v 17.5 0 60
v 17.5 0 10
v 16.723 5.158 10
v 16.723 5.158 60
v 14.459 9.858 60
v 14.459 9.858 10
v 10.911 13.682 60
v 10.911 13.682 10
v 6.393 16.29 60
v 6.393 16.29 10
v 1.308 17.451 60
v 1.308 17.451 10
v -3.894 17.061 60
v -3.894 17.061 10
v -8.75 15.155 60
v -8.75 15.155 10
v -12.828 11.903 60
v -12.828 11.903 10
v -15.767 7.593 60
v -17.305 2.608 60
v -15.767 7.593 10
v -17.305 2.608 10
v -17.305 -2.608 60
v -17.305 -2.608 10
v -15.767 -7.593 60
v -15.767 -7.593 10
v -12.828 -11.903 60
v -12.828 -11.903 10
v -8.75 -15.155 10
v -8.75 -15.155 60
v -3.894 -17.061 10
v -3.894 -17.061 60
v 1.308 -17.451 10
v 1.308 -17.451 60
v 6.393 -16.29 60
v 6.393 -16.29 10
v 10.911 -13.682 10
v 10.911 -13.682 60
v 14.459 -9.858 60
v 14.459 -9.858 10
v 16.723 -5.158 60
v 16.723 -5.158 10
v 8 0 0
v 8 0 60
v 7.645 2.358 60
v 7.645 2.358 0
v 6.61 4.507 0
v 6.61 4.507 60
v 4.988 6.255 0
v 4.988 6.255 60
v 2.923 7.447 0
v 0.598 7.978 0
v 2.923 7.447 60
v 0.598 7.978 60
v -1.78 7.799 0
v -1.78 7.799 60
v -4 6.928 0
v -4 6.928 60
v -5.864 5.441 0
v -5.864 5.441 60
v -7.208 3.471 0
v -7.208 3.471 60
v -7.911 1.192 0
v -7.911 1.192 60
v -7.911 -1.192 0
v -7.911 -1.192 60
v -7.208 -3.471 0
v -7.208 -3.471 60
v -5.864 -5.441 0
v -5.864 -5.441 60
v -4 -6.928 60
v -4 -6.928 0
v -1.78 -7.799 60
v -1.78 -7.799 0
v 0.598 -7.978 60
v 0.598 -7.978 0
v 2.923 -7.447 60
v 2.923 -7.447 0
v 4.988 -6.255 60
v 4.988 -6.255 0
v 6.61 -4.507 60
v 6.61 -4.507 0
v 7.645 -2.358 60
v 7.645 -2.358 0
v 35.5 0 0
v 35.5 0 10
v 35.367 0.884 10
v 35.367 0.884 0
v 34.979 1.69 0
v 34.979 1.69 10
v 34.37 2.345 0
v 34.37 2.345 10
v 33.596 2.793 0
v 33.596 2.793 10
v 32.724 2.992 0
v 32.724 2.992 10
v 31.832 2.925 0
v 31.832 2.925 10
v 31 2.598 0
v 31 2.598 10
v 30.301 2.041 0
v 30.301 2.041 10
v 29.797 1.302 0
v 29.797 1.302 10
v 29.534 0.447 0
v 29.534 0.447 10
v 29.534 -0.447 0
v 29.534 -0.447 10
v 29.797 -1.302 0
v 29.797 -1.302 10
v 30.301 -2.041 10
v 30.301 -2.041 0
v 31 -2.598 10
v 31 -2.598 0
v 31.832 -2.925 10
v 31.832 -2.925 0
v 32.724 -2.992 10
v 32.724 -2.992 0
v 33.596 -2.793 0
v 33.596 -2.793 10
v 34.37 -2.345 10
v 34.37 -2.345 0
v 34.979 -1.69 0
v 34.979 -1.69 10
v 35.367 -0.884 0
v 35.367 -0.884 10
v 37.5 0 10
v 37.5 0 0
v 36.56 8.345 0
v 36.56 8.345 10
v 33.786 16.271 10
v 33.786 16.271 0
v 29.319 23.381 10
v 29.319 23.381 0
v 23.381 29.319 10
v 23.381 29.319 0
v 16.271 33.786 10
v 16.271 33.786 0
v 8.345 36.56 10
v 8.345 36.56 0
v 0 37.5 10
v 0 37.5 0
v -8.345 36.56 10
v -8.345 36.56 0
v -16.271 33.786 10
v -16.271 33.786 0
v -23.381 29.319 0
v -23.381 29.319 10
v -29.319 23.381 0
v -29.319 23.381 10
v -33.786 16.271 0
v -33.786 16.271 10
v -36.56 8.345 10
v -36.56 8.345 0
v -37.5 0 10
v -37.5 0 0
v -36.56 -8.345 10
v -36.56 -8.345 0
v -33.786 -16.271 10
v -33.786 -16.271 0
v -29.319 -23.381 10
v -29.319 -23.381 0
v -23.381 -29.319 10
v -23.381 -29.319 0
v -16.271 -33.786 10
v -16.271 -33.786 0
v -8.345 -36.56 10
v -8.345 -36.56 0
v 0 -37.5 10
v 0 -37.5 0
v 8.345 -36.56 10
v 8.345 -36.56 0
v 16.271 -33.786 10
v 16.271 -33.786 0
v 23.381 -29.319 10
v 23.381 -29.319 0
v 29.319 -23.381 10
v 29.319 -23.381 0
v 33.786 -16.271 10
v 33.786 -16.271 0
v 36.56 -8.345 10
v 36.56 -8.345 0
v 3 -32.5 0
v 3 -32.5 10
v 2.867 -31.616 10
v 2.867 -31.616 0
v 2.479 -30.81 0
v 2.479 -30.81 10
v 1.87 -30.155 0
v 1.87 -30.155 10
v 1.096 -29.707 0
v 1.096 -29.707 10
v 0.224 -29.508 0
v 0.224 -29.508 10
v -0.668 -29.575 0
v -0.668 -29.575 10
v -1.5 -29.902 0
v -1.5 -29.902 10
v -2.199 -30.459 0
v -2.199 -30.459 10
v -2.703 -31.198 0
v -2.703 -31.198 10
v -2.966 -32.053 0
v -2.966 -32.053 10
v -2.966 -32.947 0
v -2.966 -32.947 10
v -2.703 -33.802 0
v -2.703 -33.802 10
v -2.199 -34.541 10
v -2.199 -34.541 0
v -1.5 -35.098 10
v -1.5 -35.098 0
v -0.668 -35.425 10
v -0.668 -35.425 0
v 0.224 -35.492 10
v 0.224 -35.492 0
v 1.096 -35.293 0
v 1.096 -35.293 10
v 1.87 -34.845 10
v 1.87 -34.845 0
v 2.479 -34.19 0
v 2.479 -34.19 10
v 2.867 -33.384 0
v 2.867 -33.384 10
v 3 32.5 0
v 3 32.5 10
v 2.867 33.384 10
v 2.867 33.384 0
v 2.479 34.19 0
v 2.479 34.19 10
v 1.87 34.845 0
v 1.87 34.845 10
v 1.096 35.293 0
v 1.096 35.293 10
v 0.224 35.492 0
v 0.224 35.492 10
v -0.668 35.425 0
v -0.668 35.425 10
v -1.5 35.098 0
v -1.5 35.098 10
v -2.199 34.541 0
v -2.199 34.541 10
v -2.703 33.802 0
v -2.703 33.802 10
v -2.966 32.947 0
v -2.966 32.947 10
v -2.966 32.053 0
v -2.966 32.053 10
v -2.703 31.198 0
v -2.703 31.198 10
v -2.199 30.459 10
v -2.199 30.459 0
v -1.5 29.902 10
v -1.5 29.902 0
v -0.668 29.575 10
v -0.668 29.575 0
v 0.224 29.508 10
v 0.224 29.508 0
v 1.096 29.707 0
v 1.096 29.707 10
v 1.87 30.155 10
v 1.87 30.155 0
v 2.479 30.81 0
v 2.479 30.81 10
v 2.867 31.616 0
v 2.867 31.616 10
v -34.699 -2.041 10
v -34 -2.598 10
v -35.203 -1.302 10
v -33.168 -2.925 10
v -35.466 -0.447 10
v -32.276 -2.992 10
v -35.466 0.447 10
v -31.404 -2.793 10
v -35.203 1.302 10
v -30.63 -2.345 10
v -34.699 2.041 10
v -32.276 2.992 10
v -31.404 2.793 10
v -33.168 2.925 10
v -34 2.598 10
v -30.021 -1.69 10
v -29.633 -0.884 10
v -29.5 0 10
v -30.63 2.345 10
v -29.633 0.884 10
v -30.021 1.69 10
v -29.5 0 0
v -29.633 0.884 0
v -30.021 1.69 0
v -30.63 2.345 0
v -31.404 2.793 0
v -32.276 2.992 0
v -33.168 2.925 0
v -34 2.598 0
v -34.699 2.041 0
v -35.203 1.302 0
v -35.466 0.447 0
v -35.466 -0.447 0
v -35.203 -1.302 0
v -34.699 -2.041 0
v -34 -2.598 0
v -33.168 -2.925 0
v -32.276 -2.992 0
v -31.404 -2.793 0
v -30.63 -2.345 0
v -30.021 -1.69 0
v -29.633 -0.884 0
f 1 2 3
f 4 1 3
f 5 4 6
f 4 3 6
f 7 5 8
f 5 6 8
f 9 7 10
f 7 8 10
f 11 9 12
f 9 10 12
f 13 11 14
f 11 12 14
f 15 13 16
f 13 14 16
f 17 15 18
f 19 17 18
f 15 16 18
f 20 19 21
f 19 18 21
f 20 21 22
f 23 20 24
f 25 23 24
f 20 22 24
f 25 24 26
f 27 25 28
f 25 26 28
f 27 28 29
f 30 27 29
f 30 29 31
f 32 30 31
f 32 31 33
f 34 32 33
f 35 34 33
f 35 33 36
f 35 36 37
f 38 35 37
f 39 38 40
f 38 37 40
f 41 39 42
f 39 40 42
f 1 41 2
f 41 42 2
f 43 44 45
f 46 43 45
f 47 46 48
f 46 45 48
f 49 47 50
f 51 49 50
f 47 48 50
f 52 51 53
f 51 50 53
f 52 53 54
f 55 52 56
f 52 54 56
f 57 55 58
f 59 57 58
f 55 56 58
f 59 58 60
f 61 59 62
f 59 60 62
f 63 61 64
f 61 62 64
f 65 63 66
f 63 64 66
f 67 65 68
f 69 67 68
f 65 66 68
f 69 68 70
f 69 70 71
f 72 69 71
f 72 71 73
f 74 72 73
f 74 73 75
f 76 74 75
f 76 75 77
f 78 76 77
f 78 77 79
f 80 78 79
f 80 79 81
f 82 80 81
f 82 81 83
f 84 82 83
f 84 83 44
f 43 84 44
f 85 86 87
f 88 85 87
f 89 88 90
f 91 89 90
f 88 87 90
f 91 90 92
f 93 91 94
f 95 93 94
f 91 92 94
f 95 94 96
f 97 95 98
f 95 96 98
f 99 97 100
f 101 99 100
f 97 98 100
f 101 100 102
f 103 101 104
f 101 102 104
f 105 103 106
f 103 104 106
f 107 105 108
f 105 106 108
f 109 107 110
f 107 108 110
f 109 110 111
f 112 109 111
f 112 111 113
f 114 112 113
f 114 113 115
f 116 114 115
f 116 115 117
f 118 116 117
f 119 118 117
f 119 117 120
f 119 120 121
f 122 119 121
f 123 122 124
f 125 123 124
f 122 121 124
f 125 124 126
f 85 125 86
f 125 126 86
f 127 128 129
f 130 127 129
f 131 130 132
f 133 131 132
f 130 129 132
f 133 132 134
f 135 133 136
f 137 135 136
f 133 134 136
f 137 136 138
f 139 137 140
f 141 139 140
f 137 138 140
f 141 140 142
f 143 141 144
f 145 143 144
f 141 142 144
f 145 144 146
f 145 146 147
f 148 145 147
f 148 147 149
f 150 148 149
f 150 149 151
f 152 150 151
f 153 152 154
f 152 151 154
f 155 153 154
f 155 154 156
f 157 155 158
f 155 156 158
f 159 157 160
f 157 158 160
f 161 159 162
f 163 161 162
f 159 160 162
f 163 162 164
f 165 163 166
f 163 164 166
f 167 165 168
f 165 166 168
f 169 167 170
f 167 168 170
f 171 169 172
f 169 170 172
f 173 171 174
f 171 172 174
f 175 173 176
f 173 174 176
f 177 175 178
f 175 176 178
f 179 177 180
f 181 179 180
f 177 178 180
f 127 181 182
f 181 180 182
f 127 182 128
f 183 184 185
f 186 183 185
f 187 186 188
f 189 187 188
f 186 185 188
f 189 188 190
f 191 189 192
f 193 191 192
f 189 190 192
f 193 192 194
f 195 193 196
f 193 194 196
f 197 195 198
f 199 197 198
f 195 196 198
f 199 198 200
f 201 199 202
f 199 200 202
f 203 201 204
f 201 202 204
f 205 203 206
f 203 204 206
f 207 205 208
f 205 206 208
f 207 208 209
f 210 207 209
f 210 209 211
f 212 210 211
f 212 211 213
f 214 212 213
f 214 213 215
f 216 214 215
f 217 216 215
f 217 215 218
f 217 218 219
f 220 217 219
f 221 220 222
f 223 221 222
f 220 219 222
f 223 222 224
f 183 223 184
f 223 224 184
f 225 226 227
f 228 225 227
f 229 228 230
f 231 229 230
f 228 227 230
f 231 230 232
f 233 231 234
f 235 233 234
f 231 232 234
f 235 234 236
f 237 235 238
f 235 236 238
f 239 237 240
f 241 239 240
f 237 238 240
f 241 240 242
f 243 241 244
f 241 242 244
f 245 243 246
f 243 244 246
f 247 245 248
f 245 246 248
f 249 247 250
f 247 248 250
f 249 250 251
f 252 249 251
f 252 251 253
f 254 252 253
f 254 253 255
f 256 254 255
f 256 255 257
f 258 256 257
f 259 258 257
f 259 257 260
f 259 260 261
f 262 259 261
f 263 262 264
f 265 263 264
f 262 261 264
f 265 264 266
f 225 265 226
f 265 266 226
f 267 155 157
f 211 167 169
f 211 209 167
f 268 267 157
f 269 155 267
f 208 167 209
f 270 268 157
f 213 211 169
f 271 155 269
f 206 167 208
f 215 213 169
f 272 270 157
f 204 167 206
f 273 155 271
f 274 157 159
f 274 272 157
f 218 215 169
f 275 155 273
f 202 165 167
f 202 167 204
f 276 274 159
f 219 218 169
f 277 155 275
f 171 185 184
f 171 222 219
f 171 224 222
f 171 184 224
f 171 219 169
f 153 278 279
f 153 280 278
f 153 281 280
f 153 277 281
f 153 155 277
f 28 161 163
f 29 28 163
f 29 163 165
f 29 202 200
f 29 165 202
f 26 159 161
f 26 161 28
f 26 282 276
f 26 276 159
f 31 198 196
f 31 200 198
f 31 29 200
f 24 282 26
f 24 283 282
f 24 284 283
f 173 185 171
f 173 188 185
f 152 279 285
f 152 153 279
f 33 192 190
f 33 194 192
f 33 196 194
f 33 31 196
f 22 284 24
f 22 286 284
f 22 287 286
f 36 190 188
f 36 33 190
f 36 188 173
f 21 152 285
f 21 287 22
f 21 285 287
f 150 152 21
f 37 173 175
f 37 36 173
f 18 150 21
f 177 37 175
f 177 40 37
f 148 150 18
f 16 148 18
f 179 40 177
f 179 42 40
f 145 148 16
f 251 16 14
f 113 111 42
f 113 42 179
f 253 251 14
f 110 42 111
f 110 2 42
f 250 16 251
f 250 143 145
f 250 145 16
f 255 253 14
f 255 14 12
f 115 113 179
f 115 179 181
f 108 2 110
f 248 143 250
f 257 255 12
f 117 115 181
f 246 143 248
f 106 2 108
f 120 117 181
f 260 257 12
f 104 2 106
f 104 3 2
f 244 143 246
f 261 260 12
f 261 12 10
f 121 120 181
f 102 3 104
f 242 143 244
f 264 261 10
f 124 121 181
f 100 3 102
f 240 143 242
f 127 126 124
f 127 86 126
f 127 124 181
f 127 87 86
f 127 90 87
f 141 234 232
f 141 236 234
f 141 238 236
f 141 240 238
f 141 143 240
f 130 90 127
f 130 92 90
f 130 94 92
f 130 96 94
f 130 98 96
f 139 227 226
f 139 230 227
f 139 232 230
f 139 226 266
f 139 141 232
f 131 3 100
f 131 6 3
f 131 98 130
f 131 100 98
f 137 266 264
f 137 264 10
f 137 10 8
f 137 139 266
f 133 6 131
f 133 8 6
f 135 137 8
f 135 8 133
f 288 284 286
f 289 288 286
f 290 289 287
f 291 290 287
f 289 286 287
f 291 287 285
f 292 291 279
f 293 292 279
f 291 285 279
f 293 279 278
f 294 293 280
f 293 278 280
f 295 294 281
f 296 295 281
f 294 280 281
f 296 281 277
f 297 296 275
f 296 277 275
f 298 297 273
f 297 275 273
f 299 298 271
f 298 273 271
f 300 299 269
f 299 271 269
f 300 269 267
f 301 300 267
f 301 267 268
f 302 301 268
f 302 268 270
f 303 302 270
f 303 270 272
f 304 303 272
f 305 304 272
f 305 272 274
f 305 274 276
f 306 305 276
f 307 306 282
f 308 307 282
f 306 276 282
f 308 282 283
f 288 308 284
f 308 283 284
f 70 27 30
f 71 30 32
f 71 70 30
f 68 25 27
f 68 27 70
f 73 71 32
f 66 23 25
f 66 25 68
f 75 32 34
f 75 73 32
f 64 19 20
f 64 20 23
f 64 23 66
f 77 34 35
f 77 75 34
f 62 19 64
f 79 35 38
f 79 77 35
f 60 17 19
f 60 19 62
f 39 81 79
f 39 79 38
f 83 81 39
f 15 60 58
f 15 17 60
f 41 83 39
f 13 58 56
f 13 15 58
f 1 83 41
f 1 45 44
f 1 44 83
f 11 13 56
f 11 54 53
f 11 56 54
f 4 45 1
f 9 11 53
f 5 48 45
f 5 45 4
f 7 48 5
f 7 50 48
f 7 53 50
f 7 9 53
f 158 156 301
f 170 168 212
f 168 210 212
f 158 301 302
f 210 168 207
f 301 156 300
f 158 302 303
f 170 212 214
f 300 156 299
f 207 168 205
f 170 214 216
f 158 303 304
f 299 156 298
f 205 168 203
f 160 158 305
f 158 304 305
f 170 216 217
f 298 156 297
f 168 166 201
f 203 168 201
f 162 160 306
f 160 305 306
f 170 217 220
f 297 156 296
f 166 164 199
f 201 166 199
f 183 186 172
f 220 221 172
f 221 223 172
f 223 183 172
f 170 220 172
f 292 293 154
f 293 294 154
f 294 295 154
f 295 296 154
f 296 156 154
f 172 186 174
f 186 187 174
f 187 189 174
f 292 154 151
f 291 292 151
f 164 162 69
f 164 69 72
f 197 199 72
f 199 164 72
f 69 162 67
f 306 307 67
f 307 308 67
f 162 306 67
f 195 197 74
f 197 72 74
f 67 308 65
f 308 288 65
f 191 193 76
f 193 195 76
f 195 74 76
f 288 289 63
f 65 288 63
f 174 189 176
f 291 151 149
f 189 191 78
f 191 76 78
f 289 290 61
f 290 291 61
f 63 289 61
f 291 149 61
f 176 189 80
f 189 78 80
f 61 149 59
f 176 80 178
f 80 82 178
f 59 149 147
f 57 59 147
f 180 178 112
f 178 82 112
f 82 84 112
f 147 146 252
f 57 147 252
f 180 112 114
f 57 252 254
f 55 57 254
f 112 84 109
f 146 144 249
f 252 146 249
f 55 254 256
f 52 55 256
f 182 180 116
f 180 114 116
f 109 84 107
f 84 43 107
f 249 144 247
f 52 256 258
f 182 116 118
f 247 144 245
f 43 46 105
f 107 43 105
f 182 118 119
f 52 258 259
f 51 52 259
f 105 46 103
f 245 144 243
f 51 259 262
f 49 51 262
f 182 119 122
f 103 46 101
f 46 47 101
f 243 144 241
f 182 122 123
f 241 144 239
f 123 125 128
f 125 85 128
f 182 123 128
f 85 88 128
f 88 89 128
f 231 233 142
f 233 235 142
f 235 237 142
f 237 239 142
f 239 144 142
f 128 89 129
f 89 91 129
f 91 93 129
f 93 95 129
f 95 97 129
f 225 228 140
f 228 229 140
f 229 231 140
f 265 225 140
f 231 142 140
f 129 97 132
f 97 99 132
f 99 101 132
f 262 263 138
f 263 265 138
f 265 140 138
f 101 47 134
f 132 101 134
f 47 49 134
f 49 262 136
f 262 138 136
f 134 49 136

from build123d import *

# Parameters (mm, degrees)
SKETCH_1_R          = 37.5
EXTRUDE_1_DEPTH     = 10
SKETCH_2_R          = 17.5
EXTRUDE_2_DEPTH     = 50
SKETCH_3_R          = 8
CUT_EXTRUDE_1_DEPTH = 61
SKETCH_4_R          = 3
CUT_EXTRUDE_2_DEPTH = 10


with BuildPart() as part:
    # 草图1 → 凸台-拉伸1 (new body)
    with BuildSketch(Plane.XY):
        Circle(SKETCH_1_R)
    extrude(amount=EXTRUDE_1_DEPTH)

    # 草图2 → 凸台-拉伸2 (add)
    with BuildSketch(Plane.XY.offset(10)):
        Circle(SKETCH_2_R)
    extrude(amount=EXTRUDE_2_DEPTH)

    # 草图3 → 切除-拉伸1 (cut, through all)
    with BuildSketch(Plane.XY.offset(60)):
        Circle(SKETCH_3_R)
    extrude(amount=-CUT_EXTRUDE_1_DEPTH, mode=Mode.SUBTRACT)

    # 草图4 → 切除-拉伸2 (cut)
    with BuildSketch(Plane.XY.offset(10)):
        with Locations((0, 32.5)):
            Circle(SKETCH_4_R)
        with Locations((32.5, 0)):
            Circle(SKETCH_4_R)
        with Locations((0, -32.5)):
            Circle(SKETCH_4_R)
        with Locations((-32.5, 0)):
            Circle(SKETCH_4_R)
    extrude(amount=-CUT_EXTRUDE_2_DEPTH, mode=Mode.SUBTRACT)


solid = part.part
